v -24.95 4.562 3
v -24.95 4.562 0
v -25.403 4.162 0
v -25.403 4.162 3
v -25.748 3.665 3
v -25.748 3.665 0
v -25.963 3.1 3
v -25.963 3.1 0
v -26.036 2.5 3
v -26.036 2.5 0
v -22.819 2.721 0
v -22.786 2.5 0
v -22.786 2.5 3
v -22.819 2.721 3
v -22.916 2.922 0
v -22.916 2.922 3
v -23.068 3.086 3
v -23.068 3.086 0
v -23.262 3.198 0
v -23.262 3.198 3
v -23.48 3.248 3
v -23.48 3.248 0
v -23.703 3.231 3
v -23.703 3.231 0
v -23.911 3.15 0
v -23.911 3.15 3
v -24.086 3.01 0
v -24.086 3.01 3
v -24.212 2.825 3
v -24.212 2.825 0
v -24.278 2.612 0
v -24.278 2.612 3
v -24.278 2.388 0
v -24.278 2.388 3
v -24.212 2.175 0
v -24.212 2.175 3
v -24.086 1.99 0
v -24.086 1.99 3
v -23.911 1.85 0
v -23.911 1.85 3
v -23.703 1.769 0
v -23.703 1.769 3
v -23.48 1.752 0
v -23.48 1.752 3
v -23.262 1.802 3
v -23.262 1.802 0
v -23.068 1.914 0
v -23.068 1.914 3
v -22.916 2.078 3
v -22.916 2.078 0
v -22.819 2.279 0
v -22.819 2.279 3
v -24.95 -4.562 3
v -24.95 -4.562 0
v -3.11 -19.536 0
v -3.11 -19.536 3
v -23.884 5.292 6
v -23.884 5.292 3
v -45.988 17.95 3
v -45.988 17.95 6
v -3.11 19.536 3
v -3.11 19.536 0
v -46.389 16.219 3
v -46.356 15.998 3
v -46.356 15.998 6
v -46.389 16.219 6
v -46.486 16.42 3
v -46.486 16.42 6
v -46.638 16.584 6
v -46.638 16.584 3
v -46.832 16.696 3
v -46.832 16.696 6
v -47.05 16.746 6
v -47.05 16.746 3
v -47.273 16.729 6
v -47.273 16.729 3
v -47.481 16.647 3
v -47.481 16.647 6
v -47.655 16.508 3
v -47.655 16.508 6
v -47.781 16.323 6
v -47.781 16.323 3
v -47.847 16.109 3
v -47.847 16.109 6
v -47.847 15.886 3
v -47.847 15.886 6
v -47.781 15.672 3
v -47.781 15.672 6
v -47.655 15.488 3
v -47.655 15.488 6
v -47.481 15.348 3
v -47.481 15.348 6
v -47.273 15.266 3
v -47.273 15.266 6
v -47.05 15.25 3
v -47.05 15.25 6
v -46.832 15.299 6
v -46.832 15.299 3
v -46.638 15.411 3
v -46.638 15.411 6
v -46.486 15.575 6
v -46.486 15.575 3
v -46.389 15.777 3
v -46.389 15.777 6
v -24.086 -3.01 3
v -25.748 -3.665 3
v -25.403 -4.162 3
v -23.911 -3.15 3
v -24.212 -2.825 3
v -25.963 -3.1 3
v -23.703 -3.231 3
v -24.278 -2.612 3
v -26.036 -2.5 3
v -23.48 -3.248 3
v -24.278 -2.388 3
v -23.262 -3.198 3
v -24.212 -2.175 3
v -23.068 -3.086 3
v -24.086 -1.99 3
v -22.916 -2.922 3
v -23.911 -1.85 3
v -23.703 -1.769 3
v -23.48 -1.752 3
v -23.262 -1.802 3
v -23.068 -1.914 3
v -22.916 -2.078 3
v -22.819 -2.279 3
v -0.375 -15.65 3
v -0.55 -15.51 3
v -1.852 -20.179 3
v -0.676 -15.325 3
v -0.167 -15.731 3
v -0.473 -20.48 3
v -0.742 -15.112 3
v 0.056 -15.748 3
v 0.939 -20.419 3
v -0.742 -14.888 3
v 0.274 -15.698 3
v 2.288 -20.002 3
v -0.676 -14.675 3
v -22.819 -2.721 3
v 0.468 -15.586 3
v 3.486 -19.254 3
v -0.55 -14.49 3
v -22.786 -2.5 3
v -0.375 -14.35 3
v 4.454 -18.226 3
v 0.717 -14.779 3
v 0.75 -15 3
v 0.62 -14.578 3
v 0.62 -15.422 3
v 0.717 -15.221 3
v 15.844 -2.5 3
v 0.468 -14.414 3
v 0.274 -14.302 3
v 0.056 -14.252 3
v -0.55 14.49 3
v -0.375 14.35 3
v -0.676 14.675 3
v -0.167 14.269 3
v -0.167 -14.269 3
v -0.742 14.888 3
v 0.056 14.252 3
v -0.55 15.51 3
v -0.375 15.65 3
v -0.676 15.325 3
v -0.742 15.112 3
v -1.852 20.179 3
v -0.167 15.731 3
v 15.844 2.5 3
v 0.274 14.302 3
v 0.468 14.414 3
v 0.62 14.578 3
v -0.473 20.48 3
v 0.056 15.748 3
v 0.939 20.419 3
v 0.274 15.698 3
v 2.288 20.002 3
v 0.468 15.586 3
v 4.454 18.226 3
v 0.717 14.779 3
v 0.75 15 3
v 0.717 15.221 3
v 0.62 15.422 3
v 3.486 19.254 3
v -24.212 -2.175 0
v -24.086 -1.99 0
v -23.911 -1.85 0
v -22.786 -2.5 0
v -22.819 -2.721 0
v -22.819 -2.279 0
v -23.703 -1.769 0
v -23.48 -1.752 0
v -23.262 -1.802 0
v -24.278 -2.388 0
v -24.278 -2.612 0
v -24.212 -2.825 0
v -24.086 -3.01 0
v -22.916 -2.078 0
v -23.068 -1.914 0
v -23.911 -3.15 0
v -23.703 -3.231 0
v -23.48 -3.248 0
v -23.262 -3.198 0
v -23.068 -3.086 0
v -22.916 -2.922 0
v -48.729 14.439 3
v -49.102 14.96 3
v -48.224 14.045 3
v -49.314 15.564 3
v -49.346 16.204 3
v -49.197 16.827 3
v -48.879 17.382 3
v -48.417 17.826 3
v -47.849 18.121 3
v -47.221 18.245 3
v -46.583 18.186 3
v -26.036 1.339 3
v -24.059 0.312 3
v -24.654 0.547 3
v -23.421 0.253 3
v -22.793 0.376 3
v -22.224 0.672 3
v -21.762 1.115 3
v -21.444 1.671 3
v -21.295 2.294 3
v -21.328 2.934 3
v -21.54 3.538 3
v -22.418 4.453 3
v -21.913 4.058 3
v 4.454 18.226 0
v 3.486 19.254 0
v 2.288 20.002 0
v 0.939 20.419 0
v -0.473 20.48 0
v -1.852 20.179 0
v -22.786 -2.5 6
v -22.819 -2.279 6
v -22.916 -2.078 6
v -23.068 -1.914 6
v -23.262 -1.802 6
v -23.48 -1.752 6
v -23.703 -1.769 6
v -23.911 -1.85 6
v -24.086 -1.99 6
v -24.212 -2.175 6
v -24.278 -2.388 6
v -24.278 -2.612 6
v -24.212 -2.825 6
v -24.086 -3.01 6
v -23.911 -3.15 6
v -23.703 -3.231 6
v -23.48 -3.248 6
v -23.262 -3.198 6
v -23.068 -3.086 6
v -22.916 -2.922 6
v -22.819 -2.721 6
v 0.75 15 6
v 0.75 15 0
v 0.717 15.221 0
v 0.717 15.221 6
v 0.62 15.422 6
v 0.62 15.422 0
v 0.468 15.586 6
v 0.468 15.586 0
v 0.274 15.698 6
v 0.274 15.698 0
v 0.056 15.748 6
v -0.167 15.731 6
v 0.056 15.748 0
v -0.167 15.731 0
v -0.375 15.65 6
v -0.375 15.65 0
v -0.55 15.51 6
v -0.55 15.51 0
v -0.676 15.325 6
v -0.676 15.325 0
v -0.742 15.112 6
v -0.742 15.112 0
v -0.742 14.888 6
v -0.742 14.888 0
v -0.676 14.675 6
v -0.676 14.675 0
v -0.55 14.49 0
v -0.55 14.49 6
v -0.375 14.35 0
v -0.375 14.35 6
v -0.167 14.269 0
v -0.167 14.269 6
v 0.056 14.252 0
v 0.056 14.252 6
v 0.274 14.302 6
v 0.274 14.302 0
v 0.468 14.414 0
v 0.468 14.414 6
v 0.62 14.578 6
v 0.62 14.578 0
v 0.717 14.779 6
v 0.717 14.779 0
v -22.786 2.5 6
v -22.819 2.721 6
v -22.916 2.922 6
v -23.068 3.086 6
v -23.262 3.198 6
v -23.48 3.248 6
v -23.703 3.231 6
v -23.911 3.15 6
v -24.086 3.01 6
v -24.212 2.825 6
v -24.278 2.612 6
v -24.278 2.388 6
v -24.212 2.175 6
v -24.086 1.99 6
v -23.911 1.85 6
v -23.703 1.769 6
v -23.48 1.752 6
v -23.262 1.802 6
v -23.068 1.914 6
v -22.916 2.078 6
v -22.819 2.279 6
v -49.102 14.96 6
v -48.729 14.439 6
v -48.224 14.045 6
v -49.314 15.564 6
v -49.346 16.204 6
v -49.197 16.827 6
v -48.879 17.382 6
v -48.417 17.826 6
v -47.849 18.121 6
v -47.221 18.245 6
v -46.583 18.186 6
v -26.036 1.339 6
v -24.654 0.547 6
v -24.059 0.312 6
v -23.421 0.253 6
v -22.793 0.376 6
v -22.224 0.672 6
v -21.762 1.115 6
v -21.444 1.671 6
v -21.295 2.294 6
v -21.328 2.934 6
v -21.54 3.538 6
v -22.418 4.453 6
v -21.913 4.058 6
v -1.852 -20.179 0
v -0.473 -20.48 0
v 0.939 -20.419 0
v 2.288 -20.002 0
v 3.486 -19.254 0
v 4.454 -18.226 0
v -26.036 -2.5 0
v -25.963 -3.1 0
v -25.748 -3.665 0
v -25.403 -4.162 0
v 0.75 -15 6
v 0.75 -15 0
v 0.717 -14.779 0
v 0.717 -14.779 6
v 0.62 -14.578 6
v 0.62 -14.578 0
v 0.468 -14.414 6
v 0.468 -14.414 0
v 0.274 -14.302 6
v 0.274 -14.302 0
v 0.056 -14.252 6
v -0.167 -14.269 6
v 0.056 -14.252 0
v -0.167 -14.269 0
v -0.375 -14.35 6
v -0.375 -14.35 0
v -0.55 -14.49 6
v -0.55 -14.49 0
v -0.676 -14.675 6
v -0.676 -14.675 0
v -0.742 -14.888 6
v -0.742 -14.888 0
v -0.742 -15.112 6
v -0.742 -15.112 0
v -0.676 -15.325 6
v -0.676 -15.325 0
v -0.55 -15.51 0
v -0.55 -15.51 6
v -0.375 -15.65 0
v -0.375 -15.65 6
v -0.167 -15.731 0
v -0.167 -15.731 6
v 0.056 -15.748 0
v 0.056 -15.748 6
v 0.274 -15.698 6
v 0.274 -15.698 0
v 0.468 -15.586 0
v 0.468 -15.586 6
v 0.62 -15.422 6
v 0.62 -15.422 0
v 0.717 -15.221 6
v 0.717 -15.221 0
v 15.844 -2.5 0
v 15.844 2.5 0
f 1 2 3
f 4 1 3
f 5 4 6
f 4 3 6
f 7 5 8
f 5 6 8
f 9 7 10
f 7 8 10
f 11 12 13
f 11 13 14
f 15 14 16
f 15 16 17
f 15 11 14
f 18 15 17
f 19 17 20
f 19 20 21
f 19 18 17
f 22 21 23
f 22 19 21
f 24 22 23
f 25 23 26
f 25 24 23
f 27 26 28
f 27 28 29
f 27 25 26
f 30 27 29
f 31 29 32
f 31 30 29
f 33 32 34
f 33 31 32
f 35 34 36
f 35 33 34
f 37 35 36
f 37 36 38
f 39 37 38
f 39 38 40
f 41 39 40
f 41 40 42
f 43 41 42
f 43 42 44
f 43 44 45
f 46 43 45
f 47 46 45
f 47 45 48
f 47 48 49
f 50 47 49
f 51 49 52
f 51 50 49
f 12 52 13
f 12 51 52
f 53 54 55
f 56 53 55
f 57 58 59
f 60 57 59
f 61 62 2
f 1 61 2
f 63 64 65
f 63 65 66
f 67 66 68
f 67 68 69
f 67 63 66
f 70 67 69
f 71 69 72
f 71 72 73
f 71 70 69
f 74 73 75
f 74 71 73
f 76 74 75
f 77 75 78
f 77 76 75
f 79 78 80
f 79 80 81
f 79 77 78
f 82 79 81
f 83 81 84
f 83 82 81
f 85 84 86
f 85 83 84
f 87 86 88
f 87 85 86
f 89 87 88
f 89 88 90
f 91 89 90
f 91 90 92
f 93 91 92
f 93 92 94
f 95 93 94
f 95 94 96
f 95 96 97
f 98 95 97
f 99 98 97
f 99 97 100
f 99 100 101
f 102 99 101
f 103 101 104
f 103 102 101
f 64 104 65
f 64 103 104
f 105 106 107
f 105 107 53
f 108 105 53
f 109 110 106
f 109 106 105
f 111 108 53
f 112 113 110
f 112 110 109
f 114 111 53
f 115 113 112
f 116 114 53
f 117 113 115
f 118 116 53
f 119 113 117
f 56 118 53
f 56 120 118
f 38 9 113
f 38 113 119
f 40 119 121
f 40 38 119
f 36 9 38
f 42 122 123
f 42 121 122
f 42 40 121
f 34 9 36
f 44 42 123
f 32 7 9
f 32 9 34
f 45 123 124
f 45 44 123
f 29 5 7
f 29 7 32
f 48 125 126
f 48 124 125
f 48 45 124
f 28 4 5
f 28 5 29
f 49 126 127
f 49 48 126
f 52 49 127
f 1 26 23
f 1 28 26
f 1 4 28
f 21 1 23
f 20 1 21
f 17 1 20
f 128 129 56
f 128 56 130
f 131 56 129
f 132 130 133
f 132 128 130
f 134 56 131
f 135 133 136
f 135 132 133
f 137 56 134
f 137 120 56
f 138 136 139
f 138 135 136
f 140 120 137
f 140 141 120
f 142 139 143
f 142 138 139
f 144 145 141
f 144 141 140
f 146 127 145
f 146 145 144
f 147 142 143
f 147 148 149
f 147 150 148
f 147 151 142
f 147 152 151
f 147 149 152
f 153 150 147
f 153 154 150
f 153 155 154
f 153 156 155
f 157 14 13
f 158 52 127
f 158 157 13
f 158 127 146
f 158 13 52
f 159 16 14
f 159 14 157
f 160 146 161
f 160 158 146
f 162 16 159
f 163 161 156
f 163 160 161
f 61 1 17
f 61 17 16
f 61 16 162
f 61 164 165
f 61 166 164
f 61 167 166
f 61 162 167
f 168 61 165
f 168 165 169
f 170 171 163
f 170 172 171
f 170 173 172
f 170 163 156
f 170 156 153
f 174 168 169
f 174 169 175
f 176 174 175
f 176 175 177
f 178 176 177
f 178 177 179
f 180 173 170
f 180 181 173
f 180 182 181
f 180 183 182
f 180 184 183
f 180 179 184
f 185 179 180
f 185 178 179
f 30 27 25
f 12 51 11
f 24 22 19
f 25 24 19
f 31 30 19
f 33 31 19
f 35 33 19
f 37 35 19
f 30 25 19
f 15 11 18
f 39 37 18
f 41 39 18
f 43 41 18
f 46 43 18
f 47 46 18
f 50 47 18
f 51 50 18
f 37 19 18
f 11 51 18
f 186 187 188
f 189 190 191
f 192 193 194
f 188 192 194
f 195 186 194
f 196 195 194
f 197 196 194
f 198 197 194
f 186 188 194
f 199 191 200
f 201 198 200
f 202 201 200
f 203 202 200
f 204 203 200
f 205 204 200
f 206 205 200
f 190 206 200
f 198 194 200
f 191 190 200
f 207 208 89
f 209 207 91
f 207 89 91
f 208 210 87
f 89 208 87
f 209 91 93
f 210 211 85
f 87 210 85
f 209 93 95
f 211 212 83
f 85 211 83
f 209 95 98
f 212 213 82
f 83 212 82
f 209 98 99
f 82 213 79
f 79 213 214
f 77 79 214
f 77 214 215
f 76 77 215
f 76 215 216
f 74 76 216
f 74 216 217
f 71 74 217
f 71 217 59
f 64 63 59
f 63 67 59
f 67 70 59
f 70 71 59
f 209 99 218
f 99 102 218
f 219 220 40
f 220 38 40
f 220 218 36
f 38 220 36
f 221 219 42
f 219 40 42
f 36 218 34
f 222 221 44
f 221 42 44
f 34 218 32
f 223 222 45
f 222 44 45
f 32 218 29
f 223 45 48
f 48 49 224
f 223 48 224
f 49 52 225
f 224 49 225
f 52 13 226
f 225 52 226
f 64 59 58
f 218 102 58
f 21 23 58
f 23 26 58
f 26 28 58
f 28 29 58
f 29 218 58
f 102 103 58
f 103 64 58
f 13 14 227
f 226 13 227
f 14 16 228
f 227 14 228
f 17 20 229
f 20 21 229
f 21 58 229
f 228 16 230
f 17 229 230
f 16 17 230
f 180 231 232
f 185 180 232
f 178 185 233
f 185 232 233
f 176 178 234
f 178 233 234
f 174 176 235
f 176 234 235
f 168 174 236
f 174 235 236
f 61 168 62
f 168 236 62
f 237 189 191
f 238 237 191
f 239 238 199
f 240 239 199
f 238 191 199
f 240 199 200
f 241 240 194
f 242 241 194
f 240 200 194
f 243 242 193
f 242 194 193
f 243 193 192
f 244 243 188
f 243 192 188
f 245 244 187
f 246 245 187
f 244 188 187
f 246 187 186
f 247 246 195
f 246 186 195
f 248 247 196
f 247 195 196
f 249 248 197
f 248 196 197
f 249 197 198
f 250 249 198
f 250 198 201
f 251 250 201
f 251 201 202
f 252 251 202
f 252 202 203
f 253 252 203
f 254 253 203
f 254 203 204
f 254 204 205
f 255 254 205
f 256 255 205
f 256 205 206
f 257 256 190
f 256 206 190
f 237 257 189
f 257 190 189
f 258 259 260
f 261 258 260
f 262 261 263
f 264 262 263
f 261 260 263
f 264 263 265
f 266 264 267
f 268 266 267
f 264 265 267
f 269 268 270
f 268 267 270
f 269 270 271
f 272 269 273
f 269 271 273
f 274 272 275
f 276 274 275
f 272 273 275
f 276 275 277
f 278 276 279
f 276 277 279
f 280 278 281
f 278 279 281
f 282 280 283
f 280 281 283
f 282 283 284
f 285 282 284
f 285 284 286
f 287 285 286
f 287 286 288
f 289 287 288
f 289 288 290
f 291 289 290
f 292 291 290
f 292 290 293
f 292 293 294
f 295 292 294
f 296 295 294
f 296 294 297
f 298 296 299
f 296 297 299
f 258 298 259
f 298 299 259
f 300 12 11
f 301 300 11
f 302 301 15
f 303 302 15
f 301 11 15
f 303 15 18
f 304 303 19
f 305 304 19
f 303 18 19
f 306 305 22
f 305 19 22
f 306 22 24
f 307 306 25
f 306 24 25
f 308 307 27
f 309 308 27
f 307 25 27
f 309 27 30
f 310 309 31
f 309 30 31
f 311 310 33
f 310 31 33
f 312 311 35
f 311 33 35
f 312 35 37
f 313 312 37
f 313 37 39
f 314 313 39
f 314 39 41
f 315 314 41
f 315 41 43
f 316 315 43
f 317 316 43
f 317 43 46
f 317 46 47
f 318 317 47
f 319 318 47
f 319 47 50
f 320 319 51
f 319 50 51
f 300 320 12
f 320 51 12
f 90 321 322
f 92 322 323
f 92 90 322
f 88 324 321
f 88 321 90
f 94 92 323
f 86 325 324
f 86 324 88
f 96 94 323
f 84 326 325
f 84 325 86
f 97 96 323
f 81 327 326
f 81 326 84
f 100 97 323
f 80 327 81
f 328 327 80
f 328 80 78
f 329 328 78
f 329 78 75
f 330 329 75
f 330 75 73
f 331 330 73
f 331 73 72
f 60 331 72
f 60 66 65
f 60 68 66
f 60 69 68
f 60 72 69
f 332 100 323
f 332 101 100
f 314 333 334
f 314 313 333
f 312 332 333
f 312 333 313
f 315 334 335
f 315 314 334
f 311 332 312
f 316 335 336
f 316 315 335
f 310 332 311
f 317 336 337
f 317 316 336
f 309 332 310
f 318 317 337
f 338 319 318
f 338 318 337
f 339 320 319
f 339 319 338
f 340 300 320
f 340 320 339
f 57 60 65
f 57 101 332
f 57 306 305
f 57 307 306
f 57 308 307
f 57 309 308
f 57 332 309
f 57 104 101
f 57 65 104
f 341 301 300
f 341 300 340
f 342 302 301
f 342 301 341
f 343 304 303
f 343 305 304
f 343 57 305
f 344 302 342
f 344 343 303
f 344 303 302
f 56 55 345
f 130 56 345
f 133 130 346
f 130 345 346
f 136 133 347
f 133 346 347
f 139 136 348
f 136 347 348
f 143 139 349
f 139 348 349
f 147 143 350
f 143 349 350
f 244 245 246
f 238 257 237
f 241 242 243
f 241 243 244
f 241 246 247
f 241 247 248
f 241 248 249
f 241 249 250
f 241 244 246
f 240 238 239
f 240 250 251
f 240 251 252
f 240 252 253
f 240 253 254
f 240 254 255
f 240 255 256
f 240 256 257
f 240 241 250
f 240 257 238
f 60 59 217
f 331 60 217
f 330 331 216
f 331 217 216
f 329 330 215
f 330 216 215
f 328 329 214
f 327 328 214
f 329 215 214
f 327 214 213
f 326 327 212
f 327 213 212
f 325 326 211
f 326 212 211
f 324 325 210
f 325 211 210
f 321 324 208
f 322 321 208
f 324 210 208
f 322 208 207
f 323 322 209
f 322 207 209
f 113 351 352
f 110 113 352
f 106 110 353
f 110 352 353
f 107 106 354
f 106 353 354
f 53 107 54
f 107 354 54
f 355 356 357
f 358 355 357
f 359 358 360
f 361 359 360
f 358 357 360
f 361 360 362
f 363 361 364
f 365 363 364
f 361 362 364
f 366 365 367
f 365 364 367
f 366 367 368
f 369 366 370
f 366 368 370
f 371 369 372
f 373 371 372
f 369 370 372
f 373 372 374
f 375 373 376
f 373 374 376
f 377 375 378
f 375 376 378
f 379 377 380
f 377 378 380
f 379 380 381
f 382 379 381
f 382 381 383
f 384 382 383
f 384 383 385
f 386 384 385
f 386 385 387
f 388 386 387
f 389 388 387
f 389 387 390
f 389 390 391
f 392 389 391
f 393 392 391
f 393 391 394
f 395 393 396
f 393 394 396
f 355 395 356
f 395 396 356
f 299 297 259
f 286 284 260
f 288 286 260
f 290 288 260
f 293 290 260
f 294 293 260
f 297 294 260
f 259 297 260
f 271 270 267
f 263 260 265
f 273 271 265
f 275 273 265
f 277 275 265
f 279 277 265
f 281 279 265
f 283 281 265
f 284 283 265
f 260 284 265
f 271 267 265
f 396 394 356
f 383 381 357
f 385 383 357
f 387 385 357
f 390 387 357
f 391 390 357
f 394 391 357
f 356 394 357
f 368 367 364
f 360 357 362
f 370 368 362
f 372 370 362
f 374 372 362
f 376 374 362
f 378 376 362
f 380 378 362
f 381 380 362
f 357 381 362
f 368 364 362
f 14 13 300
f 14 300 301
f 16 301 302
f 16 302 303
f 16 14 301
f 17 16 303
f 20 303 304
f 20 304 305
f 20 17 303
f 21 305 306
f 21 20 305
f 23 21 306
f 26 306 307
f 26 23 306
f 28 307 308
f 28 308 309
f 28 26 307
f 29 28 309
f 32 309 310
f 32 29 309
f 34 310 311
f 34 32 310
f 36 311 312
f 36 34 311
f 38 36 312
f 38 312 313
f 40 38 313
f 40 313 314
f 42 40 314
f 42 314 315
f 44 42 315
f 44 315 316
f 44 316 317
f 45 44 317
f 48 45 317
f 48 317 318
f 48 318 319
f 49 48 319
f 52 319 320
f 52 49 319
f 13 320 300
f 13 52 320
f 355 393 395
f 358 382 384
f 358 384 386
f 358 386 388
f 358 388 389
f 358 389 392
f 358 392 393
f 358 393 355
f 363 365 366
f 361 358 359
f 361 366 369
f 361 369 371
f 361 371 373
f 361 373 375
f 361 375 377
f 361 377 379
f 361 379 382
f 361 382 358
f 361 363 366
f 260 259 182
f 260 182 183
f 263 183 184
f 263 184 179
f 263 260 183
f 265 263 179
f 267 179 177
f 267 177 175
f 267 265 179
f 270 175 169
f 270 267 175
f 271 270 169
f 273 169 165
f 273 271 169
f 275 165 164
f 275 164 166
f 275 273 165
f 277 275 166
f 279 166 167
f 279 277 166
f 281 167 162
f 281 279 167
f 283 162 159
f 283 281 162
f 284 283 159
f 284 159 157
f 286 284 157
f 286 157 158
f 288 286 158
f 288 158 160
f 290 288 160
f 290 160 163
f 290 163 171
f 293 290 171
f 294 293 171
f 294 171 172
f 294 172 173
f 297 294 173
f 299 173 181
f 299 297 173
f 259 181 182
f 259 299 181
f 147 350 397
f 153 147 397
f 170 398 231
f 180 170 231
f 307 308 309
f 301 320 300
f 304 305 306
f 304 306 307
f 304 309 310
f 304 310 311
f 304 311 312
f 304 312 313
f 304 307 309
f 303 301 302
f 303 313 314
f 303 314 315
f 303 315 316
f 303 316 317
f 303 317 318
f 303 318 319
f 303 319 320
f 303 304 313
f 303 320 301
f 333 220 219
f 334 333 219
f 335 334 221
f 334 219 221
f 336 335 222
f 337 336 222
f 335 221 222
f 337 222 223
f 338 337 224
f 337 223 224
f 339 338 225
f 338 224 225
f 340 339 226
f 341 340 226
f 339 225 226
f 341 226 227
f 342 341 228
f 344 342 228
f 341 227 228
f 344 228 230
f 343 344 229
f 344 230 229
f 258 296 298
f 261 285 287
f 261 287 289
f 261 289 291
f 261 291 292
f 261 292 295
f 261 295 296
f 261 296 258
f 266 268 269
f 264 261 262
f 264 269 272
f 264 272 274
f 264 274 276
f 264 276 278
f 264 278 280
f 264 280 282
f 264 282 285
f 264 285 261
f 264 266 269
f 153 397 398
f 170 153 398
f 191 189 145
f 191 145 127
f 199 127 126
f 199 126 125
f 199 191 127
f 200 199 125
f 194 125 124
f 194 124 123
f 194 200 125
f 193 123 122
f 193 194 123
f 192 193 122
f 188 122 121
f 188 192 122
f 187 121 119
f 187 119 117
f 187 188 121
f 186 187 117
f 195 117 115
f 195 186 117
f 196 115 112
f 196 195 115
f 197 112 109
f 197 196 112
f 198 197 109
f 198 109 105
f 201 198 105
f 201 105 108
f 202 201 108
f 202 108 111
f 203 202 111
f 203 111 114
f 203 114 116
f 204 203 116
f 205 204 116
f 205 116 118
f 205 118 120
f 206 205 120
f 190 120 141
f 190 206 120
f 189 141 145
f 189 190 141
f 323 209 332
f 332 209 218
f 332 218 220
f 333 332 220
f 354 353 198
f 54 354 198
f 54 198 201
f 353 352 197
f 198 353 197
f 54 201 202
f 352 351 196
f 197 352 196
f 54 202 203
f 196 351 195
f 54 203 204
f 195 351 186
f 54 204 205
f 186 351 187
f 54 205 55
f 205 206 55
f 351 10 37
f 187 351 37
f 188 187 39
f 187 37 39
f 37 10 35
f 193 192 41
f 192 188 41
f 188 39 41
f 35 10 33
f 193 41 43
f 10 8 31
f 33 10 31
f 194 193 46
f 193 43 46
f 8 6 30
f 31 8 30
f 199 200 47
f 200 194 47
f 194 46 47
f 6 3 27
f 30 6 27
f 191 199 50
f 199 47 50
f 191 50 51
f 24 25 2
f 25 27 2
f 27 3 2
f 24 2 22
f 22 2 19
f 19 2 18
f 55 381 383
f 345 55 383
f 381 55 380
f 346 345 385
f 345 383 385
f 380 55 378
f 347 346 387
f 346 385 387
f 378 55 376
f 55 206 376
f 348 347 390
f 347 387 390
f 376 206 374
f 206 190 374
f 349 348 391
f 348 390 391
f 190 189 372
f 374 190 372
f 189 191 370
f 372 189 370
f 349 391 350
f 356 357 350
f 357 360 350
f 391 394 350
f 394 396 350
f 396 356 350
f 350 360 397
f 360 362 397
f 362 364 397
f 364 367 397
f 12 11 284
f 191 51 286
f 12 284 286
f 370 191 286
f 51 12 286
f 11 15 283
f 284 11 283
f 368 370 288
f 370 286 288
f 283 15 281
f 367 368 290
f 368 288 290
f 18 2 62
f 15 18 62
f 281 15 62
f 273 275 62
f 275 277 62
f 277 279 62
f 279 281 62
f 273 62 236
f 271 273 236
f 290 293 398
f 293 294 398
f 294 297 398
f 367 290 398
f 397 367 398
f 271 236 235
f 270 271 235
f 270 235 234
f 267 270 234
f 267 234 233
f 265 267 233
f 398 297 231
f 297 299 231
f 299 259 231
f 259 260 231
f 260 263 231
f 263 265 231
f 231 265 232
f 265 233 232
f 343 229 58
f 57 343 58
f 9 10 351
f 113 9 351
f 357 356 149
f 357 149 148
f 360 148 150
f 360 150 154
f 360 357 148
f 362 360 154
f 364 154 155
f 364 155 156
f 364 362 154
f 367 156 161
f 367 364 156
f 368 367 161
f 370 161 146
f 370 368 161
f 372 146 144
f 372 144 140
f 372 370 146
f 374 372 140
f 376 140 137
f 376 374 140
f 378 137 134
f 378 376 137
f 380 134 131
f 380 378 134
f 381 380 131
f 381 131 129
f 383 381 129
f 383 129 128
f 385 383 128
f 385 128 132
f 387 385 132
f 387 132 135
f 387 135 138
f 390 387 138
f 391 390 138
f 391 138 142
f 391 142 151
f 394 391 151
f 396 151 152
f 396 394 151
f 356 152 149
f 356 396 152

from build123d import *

# Parameters (mm, degrees)
F0_R     = 0.75
F1_DEPTH = 3
F2_DEPTH = 6
F3_R     = 0.75
F4_DEPTH = 3


with BuildPart() as f1:
    # F0 (on Top) → F1 (new body)
    with BuildSketch(Plane.XY):
        with BuildLine():
            ThreePointArc((4.454476, 18.226088), (5.232094, 16.695639), (5.5, 15))
            ThreePointArc((5.5, 15), (-2.563573, 10.133986), (-3.110215, 19.536139))
            Line((-3.110215, 19.536139), (-24.949642, 4.561882))
            ThreePointArc((-24.949642, 4.561882), (-22.370647, 4.711825), (-21.035907, 2.5))
            ThreePointArc((-21.035907, 2.5), (-21.76814, 0.732233), (-23.535907, 0))
            Line((-23.535907, 0), (15.843861, 0))
            Line((15.843861, 0), (15.843861, 2.5))
            Line((15.843861, 2.5), (4.454476, 18.226088))
        make_face()
        with BuildLine():
            ThreePointArc((-3.110215, 19.536139), (-2.563573, 10.133986), (5.5, 15))
            ThreePointArc((5.5, 15), (5.232094, 16.695639), (4.454476, 18.226088))
            ThreePointArc((4.454476, 18.226088), (0.938519, 20.419334), (-3.110215, 19.536139))
        make_face()
        with Locations((0, 15)):
            Circle(F0_R, mode=Mode.SUBTRACT)
        with BuildLine():
            ThreePointArc((-21.035907, 2.5), (-22.370647, 4.711825), (-24.949642, 4.561882))
            ThreePointArc((-24.949642, 4.561882), (-25.747732, 3.665261), (-26.035907, 2.5))
            ThreePointArc((-26.035907, 2.5), (-25.303674, 0.732233), (-23.535907, 0))
            ThreePointArc((-23.535907, 0), (-21.76814, 0.732233), (-21.035907, 2.5))
        make_face()
        with Locations((-23.535907, 2.5)):
            Circle(F0_R, mode=Mode.SUBTRACT)
        with BuildLine():
            ThreePointArc((-23.535907, 0), (-25.303674, 0.732233), (-26.035907, 2.5))
            Line((-26.035907, 2.5), (-26.035907, -2.5))
            ThreePointArc((-26.035907, -2.5), (-25.303674, -0.732233), (-23.535907, 0))
        make_face()
        with BuildLine():
            Line((15.843861, -2.5), (15.843861, 0))
            Line((15.843861, 0), (-23.535907, 0))
            ThreePointArc((-23.535907, 0), (-21.76814, -0.732233), (-21.035907, -2.5))
            ThreePointArc((-21.035907, -2.5), (-22.370647, -4.711825), (-24.949642, -4.561882))
            Line((-24.949642, -4.561882), (-3.110215, -19.536139))
            ThreePointArc((-3.110215, -19.536139), (-2.563573, -10.133986), (5.5, -15))
            ThreePointArc((5.5, -15), (5.232094, -16.695639), (4.454476, -18.226088))
            Line((4.454476, -18.226088), (15.843861, -2.5))
        make_face()
        with BuildLine():
            ThreePointArc((-3.110215, -19.536139), (0.938519, -20.419334), (4.454476, -18.226088))
            ThreePointArc((4.454476, -18.226088), (5.232094, -16.695639), (5.5, -15))
            ThreePointArc((5.5, -15), (-2.563573, -10.133986), (-3.110215, -19.536139))
        make_face()
        with Locations((0, -15)):
            Circle(F0_R, mode=Mode.SUBTRACT)
        with BuildLine():
            ThreePointArc((-21.035907, -2.5), (-21.76814, -0.732233), (-23.535907, 0))
            ThreePointArc((-23.535907, 0), (-25.303674, -0.732233), (-26.035907, -2.5))
            ThreePointArc((-26.035907, -2.5), (-25.747732, -3.665261), (-24.949642, -4.561882))
            ThreePointArc((-24.949642, -4.561882), (-22.370647, -4.711825), (-21.035907, -2.5))
        make_face()
        with Locations((-23.535907, -2.5)):
            Circle(F0_R, mode=Mode.SUBTRACT)
    extrude(amount=F1_DEPTH)


with BuildPart() as f2:
    # F0 (on Top) → F2 (new body)
    with BuildSketch(Plane.XY):
        with Locations((0, 15)):
            Circle(F0_R)
        with Locations((-23.535907, 2.5)):
            Circle(F0_R)
        with Locations((-23.535907, -2.5)):
            Circle(F0_R)
        with Locations((0, -15)):
            Circle(F0_R)
    extrude(amount=F2_DEPTH)


with BuildPart() as f4:
    # F3 (on face) → F4 (new body)
    with BuildSketch(Plane.XY.offset(3)):
        with BuildLine():
            Line((-26.035907, 1.338844), (-24.654042, 0.547495))
            ThreePointArc((-24.654042, 0.547495), (-21.583403, 1.381865), (-22.417772, 4.452505))
            Line((-22.417772, 4.452505), (-23.884299, 5.292336))
            Line((-23.884299, 5.292336), (-24.949642, 4.561882))
            ThreePointArc((-24.949642, 4.561882), (-25.747732, 3.665261), (-26.035907, 2.5))
            Line((-26.035907, 2.5), (-26.035907, 1.338844))
        make_face()
        with Locations((-23.535907, 2.5)):
            Circle(F3_R, mode=Mode.SUBTRACT)
        with BuildLine():
            Line((-48.223828, 14.045136), (-26.035907, 1.338844))
            Line((-26.035907, 1.338844), (-26.035907, 2.5))
            ThreePointArc((-26.035907, 2.5), (-25.747732, 3.665261), (-24.949642, 4.561882))
            Line((-24.949642, 4.561882), (-23.884299, 5.292336))
            Line((-23.884299, 5.292336), (-45.987558, 17.950145))
            ThreePointArc((-45.987558, 17.950145), (-49.058198, 17.115776), (-48.223828, 14.045136))
        make_face()
        with Locations((-47.105693, 15.997641)):
            Circle(F3_R, mode=Mode.SUBTRACT)
    extrude(amount=F4_DEPTH)


solid = Compound([f1.part, f2.part, f4.part])
